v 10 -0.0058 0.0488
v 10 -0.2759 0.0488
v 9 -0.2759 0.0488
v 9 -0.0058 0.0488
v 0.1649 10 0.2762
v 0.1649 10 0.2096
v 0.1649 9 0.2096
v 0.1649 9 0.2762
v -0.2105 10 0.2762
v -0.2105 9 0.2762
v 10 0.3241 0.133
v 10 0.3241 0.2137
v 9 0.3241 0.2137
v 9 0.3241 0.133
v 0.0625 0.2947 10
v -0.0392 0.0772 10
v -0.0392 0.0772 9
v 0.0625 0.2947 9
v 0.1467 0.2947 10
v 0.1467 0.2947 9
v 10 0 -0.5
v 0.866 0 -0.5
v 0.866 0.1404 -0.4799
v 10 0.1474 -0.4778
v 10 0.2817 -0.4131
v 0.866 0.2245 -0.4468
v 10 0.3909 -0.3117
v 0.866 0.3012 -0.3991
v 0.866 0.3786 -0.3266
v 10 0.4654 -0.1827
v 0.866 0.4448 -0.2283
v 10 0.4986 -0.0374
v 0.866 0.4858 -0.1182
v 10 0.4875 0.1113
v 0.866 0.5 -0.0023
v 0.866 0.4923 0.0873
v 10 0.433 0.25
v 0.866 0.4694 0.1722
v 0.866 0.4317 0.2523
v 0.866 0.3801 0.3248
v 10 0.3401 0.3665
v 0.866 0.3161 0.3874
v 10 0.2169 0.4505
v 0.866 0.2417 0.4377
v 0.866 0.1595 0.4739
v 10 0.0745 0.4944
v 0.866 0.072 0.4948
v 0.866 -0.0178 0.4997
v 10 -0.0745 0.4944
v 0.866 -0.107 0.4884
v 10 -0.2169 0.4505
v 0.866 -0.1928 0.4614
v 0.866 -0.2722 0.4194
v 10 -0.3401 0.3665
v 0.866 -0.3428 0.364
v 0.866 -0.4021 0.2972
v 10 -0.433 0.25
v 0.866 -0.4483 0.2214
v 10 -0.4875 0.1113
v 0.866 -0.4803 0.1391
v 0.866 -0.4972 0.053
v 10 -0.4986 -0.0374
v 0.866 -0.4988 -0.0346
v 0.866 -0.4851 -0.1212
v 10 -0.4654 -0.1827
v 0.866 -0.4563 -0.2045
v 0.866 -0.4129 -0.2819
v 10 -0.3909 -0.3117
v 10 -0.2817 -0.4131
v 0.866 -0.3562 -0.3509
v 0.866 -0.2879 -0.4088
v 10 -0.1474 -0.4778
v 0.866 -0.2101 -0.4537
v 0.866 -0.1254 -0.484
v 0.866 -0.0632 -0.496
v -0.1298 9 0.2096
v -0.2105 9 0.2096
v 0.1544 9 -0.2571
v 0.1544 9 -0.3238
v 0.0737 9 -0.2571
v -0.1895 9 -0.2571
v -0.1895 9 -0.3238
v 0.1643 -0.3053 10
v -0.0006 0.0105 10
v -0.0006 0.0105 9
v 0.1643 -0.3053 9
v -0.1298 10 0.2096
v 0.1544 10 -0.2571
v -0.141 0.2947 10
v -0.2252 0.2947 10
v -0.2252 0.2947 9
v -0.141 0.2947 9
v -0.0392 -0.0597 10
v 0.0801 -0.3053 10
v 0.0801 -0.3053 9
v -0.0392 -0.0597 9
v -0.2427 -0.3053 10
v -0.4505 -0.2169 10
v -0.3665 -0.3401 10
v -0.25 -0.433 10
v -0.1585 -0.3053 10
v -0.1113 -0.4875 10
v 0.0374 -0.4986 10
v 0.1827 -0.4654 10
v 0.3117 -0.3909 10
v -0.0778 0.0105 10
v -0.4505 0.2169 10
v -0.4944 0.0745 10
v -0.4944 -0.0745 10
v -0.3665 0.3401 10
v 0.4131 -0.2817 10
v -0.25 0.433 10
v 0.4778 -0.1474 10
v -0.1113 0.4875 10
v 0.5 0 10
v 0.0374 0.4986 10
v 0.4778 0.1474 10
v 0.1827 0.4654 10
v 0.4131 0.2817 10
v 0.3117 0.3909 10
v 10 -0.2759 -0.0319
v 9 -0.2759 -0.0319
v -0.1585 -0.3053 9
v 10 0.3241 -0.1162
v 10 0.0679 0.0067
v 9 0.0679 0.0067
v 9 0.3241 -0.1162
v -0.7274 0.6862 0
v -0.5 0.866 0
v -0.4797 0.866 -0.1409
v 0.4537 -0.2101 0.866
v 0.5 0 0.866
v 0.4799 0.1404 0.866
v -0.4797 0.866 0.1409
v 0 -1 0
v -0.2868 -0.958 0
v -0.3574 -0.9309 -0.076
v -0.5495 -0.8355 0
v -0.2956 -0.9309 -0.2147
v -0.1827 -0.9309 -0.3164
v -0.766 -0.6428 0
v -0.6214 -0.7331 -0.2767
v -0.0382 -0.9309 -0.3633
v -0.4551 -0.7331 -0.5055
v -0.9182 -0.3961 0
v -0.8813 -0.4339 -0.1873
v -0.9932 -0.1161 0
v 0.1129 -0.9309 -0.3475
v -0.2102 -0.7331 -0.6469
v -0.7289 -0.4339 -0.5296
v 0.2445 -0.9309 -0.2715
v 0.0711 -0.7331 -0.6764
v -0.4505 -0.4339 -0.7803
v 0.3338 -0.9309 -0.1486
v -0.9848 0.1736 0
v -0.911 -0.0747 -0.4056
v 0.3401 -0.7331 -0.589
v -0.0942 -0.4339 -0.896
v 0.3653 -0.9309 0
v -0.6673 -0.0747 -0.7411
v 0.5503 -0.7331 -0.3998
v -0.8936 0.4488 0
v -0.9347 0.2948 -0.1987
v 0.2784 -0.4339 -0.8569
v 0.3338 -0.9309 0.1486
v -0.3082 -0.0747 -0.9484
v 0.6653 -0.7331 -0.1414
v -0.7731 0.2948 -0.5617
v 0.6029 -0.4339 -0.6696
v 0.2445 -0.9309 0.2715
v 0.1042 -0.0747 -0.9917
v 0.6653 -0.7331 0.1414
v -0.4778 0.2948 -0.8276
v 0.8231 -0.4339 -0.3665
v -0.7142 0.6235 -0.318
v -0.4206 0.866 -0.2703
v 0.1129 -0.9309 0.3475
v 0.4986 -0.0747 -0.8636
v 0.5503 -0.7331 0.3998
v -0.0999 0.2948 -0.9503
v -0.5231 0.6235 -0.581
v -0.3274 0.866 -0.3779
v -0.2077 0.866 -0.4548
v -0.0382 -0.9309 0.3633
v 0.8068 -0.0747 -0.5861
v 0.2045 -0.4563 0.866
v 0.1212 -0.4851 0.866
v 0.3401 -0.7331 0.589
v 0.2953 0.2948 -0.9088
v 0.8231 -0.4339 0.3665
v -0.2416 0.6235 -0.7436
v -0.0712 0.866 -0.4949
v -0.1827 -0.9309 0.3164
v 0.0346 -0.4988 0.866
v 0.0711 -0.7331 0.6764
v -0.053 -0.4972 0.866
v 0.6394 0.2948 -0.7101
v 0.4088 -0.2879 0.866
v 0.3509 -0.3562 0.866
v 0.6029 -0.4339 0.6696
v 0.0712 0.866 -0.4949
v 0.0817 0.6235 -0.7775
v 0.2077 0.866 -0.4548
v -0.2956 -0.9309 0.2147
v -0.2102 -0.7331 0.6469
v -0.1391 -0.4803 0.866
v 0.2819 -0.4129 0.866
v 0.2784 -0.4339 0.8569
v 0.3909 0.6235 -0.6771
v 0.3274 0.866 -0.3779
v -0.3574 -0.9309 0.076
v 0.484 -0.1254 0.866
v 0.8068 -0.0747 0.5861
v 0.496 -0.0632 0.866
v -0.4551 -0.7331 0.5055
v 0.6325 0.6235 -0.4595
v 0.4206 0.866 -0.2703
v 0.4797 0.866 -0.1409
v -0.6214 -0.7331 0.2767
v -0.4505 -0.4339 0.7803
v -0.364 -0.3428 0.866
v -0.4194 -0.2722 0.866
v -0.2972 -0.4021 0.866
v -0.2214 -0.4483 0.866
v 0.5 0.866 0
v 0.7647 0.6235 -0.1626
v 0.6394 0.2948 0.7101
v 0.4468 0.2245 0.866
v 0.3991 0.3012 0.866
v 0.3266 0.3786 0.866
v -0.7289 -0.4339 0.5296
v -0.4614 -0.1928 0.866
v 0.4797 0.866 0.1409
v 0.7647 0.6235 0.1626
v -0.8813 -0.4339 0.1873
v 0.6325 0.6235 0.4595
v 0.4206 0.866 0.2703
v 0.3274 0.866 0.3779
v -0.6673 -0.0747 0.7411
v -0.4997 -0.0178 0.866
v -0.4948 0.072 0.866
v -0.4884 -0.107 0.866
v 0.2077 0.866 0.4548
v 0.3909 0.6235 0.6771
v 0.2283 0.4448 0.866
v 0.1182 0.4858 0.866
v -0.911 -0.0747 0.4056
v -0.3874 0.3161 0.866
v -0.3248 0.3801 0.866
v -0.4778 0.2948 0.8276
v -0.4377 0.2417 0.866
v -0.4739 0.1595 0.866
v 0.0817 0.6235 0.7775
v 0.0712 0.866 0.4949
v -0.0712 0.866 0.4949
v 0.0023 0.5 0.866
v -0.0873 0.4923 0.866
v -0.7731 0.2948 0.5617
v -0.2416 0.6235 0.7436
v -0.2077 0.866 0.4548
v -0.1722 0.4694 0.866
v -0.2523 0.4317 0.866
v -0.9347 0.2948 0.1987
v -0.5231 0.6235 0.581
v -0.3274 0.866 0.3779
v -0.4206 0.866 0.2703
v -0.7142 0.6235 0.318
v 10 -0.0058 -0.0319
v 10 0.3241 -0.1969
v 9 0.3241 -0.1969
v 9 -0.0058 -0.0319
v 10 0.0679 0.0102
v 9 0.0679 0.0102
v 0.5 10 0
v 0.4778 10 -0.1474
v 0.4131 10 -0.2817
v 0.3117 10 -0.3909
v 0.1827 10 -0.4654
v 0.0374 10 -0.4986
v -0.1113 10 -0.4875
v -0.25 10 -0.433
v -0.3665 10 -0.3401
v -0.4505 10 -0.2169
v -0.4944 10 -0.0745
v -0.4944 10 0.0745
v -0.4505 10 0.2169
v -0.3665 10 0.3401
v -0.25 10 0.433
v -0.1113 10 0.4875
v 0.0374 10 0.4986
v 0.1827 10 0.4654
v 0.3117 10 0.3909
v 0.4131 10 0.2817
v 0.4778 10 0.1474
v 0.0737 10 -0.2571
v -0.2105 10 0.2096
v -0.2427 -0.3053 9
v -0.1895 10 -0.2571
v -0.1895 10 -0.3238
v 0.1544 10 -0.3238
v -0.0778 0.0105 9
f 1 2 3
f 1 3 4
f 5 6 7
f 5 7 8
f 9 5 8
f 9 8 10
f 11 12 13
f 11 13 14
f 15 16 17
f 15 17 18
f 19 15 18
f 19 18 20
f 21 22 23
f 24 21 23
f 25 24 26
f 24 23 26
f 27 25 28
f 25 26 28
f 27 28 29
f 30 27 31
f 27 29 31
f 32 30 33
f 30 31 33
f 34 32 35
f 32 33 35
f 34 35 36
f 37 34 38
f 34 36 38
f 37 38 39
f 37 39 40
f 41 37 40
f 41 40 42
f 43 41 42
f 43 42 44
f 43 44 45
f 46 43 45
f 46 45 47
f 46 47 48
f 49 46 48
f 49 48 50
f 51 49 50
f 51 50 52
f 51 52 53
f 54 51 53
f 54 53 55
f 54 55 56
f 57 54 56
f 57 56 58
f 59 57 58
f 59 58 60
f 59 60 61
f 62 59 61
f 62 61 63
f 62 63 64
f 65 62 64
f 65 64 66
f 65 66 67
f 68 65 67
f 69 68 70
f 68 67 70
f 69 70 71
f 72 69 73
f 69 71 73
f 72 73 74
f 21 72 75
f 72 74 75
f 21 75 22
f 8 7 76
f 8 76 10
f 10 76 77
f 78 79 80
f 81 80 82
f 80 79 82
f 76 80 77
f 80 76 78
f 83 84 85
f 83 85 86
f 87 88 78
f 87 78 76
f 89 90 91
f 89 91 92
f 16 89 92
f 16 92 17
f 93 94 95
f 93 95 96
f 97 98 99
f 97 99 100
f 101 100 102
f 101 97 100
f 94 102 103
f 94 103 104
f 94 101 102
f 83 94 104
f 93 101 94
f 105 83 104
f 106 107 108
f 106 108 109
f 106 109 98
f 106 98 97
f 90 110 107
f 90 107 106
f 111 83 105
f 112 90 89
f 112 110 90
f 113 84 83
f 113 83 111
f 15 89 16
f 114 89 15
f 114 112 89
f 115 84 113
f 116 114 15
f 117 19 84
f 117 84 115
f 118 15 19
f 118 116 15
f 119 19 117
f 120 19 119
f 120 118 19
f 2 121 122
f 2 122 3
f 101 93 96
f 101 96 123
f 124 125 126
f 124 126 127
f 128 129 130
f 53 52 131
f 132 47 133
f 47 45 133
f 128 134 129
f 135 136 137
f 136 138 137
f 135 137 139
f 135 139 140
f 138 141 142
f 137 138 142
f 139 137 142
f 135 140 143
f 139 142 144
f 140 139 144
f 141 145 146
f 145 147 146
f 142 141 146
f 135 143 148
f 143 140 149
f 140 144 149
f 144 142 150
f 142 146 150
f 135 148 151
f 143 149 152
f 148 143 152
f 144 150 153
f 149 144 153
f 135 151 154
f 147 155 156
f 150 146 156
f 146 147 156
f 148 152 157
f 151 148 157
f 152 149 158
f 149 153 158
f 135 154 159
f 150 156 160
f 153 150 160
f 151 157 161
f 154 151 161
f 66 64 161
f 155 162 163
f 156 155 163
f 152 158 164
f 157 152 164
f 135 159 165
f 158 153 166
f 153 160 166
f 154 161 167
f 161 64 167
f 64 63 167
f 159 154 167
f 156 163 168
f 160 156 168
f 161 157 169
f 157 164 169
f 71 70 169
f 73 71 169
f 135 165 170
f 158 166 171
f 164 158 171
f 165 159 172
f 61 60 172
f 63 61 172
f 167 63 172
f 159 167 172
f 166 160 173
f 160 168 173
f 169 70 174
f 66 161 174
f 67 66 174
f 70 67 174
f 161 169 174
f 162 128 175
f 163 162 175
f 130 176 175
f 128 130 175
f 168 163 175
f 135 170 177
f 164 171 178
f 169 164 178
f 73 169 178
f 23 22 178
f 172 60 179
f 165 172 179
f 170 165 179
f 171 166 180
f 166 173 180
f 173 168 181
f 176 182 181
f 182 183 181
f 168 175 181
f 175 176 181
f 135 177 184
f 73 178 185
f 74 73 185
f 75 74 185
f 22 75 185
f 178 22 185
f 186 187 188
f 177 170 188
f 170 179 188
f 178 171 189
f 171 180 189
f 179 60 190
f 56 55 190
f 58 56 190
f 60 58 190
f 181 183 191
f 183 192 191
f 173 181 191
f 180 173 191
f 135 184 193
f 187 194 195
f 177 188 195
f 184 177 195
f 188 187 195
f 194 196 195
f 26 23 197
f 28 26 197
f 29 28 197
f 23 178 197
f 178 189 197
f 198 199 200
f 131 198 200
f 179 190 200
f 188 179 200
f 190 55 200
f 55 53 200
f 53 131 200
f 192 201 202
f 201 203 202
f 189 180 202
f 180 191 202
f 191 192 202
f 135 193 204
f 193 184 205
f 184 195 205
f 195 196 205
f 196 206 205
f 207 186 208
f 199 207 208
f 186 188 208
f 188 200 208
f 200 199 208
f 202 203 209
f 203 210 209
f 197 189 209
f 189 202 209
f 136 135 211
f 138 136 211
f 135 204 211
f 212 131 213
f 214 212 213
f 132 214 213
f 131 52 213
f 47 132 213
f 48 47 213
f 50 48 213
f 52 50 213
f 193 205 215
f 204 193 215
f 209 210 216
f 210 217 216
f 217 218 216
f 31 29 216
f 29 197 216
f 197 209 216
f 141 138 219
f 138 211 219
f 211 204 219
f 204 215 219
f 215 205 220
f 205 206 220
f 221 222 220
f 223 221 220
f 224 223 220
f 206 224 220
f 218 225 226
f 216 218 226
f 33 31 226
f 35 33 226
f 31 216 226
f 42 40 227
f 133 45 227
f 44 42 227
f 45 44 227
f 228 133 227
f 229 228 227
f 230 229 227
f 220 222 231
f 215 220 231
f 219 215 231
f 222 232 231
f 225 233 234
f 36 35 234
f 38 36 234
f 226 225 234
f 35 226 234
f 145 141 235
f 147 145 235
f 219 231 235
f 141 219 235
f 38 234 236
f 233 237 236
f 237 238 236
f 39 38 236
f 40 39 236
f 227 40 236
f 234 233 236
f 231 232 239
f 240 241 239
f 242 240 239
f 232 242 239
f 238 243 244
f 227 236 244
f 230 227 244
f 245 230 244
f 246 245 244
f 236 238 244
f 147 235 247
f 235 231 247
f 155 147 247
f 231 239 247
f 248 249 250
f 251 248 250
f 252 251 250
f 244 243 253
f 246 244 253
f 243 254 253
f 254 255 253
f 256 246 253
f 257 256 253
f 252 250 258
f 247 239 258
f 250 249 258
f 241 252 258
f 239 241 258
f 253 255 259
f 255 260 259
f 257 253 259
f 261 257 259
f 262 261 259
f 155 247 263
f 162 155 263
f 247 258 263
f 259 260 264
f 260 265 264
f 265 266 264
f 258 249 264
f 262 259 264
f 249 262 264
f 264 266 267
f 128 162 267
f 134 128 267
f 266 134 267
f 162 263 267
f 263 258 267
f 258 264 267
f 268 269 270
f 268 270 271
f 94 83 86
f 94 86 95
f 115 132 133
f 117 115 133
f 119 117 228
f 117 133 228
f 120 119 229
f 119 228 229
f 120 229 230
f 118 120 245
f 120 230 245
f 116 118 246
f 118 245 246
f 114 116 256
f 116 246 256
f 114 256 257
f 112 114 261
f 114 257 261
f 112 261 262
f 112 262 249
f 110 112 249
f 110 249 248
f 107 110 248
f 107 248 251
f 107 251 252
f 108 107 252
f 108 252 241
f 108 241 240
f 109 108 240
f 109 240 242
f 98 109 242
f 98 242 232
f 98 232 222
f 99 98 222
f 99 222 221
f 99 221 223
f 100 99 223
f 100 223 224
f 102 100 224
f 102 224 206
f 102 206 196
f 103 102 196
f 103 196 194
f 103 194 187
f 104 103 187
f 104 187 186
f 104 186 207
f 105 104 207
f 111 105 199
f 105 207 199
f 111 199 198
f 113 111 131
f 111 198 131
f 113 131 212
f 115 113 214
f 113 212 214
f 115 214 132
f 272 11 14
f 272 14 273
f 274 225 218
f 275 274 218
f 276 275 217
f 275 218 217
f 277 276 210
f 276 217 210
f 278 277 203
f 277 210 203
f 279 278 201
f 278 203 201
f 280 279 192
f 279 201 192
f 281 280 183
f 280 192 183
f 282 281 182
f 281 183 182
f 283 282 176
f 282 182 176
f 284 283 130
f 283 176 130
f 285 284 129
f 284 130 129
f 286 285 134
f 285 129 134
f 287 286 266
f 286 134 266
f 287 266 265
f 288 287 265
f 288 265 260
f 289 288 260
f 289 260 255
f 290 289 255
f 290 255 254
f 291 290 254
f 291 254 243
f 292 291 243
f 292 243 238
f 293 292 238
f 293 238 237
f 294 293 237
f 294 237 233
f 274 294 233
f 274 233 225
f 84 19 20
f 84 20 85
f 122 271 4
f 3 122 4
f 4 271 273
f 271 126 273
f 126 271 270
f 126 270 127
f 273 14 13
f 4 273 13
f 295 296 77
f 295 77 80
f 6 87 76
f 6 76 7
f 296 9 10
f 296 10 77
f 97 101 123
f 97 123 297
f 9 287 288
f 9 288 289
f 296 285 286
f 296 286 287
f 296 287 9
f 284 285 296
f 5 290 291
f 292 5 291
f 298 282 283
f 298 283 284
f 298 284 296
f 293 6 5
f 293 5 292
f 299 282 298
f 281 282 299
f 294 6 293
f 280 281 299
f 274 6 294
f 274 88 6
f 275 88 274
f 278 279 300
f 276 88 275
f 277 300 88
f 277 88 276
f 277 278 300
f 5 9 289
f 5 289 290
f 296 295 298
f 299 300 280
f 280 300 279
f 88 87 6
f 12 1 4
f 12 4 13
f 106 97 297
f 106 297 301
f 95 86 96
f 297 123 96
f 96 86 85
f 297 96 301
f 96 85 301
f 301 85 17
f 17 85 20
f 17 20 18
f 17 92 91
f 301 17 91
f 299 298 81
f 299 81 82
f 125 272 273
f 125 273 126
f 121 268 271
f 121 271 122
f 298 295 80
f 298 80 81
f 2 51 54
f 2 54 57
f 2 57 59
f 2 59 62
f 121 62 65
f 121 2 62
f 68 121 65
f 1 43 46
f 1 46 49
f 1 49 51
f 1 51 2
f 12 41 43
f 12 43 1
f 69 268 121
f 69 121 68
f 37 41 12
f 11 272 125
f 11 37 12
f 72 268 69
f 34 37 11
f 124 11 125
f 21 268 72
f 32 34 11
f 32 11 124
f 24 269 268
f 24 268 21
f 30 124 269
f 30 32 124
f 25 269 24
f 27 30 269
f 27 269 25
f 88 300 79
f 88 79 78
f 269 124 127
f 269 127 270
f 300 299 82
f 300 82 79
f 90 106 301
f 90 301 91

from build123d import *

# Parameters (mm, degrees)
SKETCH_2_R          = 0.5
EXTRUDE_1_DEPTH     = 10
SKETCH_3_R          = 0.5
EXTRUDE_2_DEPTH     = 10
SKETCH_4_R          = 0.5
EXTRUDE_3_DEPTH     = 10
CUT_EXTRUDE_1_DEPTH = 1
CUT_EXTRUDE_2_DEPTH = 1
CUT_EXTRUDE_3_DEPTH = 1


with BuildPart() as part:
    # 草图1 → 旋转1 (revolve)
    with BuildSketch(Plane.XY):
        with BuildLine():
            Line((0, 1), (0, -1))
            ThreePointArc((0, -1), (-1, 0), (0, 1))
        make_face()
    revolve(axis=Axis((0, 1, 0), (0, -1, 0)))

    # 草图2 → 凸台-拉伸1 (add)
    with BuildSketch(Plane(origin=(0, 0, 0), x_dir=(1, 0, 0), z_dir=(0, 1, 0))):
        Circle(SKETCH_2_R)
    extrude(amount=EXTRUDE_1_DEPTH)

    # 草图3 → 凸台-拉伸2 (add)
    with BuildSketch(Plane(origin=(0, 0, 0), x_dir=(0, 0, -1), z_dir=(1, 0, 0))):
        Circle(SKETCH_3_R)
    extrude(amount=EXTRUDE_2_DEPTH)

    # 草图4 → 凸台-拉伸3 (add)
    with BuildSketch(Plane.XY):
        Circle(SKETCH_4_R)
    extrude(amount=EXTRUDE_3_DEPTH)

    # 草图5 → 切除-拉伸1 (cut)
    with BuildSketch(Plane.XY.offset(10)):
        Polygon((0.164271664, -0.305303511), (0.080061137, -0.305303511), (-0.039237108, -0.059689476), (-0.158535354, -0.305303511), (-0.24274588, -0.305303511), (-0.0778336, 0.010485963), (-0.225202021, 0.294696489), (-0.140991494, 0.294696489), (-0.039237108, 0.07715263), (0.062517278, 0.294696489), (0.146727804, 0.294696489), (-0.000640617, 0.010485963), align=None)
    extrude(amount=-CUT_EXTRUDE_1_DEPTH, mode=Mode.SUBTRACT)

    # 草图6 → 切除-拉伸2 (cut)
    with BuildSketch(Plane(origin=(10, 0, 0), x_dir=(0, 0, -1), z_dir=(1, 0, 0))):
        Polygon((0.196855421, 0.324059335), (0.03194314, -0.005765227), (0.03194314, -0.275940665), (-0.048758614, -0.275940665), (-0.048758614, -0.005765227), (-0.213670895, 0.324059335), (-0.13296914, 0.324059335), (-0.010162123, 0.067918984), (-0.006653351, 0.067918984), (0.116153667, 0.324059335), align=None)
    extrude(amount=-CUT_EXTRUDE_2_DEPTH, mode=Mode.SUBTRACT)

    # 草图7 → 切除-拉伸3 (cut)
    with BuildSketch(Plane(origin=(0, 10, 0), x_dir=(1, 0, 0), z_dir=(0, 1, 0))):
        Polygon((0.164917999, -0.276228525), (-0.210520598, -0.276228525), (-0.210520598, -0.209561858), (0.073689928, 0.257104808), (-0.189467966, 0.257104808), (-0.189467966, 0.323771475), (0.154391683, 0.323771475), (0.154391683, 0.257104808), (-0.129818843, -0.209561858), (0.164917999, -0.209561858), align=None)
    extrude(amount=-CUT_EXTRUDE_3_DEPTH, mode=Mode.SUBTRACT)


solid = part.part
